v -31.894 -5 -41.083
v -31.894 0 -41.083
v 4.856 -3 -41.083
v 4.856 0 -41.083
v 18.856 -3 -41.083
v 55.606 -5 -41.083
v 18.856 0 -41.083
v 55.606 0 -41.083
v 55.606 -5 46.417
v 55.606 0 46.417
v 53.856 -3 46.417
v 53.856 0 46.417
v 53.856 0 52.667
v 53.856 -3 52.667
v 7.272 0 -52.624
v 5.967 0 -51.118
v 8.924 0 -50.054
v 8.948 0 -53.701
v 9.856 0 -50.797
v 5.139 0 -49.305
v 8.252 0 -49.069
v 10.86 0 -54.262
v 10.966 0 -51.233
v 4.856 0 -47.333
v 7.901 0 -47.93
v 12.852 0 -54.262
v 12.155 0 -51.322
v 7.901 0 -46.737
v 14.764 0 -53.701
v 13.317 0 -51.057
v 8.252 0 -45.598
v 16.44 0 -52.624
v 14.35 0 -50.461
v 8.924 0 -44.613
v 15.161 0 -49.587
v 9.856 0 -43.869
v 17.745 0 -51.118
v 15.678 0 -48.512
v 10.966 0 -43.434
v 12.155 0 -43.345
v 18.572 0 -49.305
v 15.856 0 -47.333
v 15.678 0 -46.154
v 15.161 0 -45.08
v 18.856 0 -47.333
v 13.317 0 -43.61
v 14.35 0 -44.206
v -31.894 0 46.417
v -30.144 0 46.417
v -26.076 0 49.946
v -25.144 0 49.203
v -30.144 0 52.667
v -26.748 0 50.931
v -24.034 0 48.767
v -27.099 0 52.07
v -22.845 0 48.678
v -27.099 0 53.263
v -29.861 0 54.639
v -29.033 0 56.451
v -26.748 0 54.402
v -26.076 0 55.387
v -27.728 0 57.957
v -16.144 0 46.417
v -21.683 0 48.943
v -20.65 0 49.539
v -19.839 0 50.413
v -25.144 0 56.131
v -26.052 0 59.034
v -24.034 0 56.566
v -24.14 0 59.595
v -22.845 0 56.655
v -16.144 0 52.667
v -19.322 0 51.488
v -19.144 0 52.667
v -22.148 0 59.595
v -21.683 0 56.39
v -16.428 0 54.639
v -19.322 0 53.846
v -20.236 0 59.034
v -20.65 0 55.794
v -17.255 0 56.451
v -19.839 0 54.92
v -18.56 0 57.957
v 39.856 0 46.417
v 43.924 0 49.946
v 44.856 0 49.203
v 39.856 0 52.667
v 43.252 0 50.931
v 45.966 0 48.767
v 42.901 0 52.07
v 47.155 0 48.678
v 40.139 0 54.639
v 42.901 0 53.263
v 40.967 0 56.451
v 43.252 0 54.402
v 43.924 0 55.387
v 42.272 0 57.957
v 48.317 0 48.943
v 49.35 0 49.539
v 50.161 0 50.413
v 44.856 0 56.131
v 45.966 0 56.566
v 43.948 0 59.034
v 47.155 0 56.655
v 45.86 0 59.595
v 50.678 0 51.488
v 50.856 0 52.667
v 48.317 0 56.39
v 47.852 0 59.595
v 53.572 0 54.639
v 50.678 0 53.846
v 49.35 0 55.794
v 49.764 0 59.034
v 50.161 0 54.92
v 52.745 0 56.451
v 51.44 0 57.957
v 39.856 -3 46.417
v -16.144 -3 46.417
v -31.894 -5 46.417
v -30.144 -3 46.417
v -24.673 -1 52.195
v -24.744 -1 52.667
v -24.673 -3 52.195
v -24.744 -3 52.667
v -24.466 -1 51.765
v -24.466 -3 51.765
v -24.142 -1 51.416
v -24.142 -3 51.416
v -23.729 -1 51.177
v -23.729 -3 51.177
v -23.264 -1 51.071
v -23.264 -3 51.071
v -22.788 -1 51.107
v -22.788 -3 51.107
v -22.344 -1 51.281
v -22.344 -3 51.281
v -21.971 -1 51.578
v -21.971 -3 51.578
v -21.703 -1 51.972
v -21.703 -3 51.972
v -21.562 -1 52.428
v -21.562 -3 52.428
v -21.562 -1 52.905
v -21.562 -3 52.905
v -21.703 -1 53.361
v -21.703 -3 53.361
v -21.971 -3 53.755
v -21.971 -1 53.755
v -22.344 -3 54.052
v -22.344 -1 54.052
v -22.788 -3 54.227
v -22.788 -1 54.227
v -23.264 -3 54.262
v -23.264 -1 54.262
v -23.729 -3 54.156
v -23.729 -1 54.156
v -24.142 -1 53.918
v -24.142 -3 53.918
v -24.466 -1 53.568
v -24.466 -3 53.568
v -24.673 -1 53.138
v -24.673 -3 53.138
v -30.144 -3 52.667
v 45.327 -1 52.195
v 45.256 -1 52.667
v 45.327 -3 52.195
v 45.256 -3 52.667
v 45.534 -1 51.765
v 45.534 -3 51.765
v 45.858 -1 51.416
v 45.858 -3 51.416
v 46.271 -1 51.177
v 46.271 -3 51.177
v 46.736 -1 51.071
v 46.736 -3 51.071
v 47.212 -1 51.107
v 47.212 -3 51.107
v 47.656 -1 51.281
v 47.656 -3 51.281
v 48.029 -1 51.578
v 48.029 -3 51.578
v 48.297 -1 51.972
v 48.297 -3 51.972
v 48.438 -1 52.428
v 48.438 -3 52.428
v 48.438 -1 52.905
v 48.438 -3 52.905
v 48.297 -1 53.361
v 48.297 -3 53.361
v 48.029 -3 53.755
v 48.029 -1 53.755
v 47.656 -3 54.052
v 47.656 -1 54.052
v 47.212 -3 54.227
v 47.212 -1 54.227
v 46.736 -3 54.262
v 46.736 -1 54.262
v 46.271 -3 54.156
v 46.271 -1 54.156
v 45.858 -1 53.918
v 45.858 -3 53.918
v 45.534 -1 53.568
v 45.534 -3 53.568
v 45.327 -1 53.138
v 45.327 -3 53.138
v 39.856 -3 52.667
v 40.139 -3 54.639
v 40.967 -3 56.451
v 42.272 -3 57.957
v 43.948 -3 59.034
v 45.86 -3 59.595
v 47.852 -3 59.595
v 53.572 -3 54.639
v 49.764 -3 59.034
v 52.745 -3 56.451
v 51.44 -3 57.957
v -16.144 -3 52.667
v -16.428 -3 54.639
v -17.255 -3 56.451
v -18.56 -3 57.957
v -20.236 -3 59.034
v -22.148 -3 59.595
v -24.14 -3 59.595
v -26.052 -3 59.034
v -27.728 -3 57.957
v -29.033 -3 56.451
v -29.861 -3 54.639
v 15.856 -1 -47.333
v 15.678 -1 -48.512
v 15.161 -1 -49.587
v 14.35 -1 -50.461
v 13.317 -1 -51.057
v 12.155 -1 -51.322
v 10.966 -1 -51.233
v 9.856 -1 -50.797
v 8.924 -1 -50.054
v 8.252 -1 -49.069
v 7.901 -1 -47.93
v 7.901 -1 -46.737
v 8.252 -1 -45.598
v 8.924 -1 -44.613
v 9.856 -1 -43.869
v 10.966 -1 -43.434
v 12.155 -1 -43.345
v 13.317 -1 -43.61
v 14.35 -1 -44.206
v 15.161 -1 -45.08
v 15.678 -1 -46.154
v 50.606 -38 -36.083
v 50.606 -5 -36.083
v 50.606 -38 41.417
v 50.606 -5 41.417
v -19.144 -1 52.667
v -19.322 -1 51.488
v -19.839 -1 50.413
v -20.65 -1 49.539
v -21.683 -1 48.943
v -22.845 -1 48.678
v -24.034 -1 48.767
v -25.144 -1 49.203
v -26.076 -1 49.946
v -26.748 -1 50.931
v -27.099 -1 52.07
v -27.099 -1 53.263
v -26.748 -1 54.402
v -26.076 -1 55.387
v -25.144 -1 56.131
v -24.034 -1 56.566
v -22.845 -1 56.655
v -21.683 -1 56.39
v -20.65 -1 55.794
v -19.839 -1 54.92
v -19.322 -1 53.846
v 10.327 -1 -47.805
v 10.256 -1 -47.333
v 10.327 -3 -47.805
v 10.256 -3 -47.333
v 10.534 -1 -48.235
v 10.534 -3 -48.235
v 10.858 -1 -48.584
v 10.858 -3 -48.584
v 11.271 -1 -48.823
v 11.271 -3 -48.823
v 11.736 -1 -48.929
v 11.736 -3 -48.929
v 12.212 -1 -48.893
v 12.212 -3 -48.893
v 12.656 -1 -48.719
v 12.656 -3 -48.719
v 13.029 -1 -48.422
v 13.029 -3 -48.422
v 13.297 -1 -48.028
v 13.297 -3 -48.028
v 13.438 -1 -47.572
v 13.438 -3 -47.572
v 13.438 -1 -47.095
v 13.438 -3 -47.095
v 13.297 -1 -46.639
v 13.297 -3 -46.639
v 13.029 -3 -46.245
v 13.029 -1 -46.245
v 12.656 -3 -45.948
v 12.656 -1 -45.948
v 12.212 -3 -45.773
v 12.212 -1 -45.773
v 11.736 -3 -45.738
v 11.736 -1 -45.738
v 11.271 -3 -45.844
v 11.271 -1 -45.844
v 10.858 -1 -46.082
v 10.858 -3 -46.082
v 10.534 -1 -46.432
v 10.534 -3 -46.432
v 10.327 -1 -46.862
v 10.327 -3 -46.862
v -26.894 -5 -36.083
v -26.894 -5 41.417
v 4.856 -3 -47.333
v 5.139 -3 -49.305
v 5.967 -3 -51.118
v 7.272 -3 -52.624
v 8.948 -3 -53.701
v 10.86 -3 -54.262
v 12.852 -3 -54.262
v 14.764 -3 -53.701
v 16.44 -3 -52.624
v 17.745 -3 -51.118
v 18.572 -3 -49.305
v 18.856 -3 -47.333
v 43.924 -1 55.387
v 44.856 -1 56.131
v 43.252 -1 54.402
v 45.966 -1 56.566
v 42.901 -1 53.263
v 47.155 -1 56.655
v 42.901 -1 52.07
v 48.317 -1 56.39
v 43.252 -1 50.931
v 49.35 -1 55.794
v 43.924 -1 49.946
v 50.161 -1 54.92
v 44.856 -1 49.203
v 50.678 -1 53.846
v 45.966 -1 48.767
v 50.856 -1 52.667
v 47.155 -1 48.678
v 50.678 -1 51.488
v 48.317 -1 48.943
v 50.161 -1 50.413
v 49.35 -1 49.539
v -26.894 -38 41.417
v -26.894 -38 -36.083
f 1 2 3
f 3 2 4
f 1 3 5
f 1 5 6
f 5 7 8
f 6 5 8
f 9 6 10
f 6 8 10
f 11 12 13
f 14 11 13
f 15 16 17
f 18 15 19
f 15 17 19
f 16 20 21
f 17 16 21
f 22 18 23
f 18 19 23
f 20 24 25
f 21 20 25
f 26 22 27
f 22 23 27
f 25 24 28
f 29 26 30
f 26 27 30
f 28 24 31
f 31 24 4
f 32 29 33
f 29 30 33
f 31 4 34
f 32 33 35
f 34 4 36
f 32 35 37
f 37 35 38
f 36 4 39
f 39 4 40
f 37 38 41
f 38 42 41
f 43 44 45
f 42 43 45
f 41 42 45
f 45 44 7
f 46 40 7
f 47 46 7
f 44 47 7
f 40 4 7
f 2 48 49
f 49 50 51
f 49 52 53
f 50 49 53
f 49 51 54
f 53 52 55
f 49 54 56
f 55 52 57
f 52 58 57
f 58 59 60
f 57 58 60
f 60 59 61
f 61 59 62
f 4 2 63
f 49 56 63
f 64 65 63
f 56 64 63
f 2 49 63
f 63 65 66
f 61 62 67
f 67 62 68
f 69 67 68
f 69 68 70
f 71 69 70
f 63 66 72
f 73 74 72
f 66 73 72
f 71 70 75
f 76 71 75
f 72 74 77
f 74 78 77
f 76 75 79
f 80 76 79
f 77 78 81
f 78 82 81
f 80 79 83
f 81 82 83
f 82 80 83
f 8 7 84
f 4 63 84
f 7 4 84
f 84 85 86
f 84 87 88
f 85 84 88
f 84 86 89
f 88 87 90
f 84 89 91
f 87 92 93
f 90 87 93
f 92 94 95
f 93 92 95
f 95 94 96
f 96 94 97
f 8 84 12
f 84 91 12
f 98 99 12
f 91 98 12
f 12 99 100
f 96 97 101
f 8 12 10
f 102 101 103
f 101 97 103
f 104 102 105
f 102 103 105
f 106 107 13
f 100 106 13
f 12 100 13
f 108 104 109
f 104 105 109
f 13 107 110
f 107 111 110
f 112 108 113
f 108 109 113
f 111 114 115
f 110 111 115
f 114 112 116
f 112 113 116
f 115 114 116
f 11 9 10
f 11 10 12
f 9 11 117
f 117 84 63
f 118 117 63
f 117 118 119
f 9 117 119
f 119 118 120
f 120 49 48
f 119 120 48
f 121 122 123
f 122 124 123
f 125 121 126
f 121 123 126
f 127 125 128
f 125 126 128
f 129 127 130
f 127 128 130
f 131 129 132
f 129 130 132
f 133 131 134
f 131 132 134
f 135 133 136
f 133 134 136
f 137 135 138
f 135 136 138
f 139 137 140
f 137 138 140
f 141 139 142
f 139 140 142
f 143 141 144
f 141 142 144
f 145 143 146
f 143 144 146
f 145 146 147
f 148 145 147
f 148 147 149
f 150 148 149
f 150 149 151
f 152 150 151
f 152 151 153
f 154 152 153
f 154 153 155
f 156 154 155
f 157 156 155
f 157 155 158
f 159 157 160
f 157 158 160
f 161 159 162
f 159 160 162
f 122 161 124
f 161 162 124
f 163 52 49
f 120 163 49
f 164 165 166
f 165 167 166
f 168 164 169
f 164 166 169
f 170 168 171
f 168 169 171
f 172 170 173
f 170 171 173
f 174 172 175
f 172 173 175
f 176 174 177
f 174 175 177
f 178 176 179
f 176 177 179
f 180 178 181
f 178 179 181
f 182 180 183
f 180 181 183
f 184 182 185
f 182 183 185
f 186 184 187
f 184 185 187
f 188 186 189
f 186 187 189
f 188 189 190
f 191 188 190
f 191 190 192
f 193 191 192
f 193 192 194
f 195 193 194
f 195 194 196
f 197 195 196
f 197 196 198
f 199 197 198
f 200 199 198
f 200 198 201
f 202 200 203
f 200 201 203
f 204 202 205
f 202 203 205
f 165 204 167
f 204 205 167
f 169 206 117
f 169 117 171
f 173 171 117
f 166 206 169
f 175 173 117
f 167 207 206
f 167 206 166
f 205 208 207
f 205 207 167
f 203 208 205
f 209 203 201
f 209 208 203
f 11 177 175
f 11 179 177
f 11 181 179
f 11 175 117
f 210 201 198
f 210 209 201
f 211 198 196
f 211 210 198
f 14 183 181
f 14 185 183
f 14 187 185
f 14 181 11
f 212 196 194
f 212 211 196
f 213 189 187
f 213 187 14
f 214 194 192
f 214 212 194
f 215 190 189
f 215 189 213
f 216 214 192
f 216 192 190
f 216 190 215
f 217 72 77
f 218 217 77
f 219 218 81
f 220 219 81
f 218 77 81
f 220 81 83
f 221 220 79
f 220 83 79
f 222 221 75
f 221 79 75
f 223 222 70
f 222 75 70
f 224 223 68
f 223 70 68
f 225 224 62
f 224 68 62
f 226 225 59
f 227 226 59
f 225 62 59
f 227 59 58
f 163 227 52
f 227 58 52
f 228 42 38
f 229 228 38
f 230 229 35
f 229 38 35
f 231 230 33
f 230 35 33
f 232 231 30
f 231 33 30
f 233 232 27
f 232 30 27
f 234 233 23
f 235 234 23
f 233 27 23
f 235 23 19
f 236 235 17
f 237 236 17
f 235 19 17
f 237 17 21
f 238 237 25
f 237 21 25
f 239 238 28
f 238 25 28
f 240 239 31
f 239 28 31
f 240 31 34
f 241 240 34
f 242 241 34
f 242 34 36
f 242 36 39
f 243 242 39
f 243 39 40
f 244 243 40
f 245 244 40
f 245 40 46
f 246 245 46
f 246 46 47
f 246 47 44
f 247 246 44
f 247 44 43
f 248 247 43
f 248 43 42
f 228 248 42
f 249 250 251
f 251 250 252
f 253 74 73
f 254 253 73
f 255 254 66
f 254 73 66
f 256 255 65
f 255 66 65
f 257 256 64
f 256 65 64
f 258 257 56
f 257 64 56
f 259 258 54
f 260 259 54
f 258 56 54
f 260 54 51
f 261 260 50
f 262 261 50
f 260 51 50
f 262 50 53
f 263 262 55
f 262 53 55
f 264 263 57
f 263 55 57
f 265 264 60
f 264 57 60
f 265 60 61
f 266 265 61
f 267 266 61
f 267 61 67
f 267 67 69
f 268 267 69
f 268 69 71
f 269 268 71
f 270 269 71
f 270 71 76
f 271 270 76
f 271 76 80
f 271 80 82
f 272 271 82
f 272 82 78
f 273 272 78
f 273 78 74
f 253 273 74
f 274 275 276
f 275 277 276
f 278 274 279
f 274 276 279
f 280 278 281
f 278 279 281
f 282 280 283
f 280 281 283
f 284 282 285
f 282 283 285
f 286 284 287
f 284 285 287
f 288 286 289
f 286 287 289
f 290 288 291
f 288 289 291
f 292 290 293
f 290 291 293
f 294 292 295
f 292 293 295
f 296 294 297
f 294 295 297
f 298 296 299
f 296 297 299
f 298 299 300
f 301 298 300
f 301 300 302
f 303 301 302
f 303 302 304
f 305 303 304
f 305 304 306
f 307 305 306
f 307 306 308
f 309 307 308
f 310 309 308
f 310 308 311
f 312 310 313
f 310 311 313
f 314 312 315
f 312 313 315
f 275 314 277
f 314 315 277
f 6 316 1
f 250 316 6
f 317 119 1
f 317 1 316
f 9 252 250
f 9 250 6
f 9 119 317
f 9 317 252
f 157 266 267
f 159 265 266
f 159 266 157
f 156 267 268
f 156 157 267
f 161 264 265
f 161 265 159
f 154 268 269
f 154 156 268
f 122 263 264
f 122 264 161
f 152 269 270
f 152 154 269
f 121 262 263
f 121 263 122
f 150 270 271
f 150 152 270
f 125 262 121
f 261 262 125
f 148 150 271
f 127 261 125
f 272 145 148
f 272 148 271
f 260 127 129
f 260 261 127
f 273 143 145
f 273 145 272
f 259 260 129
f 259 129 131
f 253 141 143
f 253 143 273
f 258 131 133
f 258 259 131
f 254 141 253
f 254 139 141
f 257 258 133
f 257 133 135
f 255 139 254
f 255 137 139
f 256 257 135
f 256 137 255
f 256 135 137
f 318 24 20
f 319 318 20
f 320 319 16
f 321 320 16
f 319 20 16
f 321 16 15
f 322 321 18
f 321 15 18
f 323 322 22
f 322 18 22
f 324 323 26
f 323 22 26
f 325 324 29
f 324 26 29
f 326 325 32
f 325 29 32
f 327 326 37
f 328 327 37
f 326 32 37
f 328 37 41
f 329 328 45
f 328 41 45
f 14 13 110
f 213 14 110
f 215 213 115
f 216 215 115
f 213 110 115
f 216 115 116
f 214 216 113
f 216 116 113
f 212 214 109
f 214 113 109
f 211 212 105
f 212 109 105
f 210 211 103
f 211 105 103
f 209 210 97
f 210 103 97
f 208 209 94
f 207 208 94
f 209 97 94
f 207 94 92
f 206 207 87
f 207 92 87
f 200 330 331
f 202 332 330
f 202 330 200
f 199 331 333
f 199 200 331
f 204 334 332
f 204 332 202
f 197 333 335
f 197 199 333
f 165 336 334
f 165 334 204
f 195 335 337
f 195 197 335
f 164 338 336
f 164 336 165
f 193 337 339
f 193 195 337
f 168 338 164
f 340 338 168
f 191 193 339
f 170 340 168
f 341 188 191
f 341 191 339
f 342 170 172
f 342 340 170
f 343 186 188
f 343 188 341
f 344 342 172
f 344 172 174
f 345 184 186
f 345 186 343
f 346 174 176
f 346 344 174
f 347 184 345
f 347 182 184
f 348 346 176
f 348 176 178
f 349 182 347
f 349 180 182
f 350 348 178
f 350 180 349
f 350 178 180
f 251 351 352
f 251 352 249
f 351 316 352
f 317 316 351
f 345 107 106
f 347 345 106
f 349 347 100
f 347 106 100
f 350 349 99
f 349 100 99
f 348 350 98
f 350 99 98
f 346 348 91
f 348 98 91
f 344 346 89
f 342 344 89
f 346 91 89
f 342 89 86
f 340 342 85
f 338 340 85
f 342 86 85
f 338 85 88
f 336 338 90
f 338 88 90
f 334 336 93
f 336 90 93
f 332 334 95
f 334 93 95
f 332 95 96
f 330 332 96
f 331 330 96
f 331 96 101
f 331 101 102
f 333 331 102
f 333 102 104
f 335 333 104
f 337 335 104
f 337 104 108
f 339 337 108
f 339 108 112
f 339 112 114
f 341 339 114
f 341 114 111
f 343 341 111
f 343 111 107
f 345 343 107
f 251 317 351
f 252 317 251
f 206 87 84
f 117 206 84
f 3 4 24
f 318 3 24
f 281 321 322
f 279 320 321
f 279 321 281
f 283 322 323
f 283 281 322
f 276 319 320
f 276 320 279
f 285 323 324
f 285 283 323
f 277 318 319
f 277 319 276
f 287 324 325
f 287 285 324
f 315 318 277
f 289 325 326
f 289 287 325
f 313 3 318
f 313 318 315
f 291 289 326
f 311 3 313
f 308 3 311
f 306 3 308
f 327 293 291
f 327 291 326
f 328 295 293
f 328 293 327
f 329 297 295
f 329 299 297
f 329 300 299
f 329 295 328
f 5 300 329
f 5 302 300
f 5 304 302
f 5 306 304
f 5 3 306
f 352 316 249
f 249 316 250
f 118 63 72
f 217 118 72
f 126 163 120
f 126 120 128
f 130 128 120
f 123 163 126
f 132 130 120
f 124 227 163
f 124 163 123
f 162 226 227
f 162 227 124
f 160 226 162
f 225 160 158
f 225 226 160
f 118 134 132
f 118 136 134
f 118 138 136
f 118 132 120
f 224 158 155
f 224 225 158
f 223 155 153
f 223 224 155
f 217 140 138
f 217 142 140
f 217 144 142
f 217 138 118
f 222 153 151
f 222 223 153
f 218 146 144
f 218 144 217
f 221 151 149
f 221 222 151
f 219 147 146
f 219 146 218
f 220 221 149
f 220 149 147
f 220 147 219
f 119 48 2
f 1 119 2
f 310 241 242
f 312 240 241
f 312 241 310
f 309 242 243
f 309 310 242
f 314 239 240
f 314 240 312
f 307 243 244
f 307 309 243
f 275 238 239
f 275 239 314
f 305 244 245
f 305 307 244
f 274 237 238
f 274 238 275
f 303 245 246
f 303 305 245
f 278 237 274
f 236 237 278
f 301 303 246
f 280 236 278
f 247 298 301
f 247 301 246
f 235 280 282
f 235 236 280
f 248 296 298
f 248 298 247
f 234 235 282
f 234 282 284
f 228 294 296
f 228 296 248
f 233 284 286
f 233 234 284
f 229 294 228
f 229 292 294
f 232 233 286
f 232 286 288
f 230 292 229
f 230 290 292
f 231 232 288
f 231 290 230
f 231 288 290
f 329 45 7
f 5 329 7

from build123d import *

# Parameters (mm, degrees)
F1_DEPTH       = 3
F2_D           = 3.2
F2_CBORE_D     = 8
F2_CBORE_DEPTH = 1
F4_DEPTH       = 2
F5_W           = 77.5
F5_H           = 77.5
F6_DEPTH       = 33


with BuildPart() as f1:
    # F0 (on Front) → F1 (new body)
    with BuildSketch(Plane.XZ):
        with BuildLine():
            Line((-31.8941220641, 46.416635698), (-31.8941220641, -41.083364302))
            Line((-31.8941220641, -41.083364302), (4.8558779359, -41.083364302))
            Line((4.8558779359, -41.083364302), (4.8558779359, -47.333364302))
            ThreePointArc((4.8558779359, -47.333364302), (11.8558779359, -54.333364302), (18.8558779359, -47.333364302))
            Line((18.8558779359, -47.333364302), (18.8558779359, -41.083364302))
            Line((18.8558779359, -41.083364302), (55.6058779359, -41.083364302))
            Line((55.6058779359, -41.083364302), (55.6058779359, 46.416635698))
            Line((55.6058779359, 46.416635698), (53.8558779359, 46.416635698))
            Line((53.8558779359, 46.416635698), (53.8558779359, 52.666635698))
            ThreePointArc((53.8558779359, 52.666635698), (46.8558779359, 59.666635698), (39.8558779359, 52.666635698))
            Line((39.8558779359, 52.666635698), (39.8558779359, 46.416635698))
            Line((39.8558779359, 46.416635698), (-16.1441220641, 46.416635698))
            Line((-16.1441220641, 46.416635698), (-16.1441220641, 52.666635698))
            ThreePointArc((-16.1441220641, 52.666635698), (-23.1441220641, 59.666635698), (-30.1441220641, 52.666635698))
            Line((-30.1441220641, 52.666635698), (-30.1441220641, 46.416635698))
            Line((-30.1441220641, 46.416635698), (-31.8941220641, 46.416635698))
        make_face()
    extrude(amount=F1_DEPTH)

    # F2 (through all)
    with Locations(Plane(origin=(0, 0, 0), x_dir=(1, 0, 0), z_dir=(0, 1, 0))):
        with Locations((-23.1441220641, -52.666635698), (46.8558779359, -52.666635698), (11.8558779359, 47.333364302)):
            CounterBoreHole(F2_D / 2, F2_CBORE_D / 2, F2_CBORE_DEPTH)

    # F3 (on face) → F4 (join)
    with BuildSketch(Plane.XZ.offset(3)):
        Polygon((-30.1441220641, 46.416635698), (-31.8941220641, 46.416635698), (-31.8941220641, -41.083364302), (4.8558779359, -41.083364302), (18.8558779359, -41.083364302), (55.6058779359, -41.083364302), (55.6058779359, 46.416635698), (53.8558779359, 46.416635698), (39.8558779359, 46.416635698), (-16.1441220641, 46.416635698), align=None)
    extrude(amount=F4_DEPTH)

    # F5 (on face) → F6 (join)
    with BuildSketch(Plane.XZ.offset(5)):
        with Locations((11.8558779359, 2.666635698)):
            Rectangle(F5_W, F5_H)
    extrude(amount=F6_DEPTH)


solid = f1.part
